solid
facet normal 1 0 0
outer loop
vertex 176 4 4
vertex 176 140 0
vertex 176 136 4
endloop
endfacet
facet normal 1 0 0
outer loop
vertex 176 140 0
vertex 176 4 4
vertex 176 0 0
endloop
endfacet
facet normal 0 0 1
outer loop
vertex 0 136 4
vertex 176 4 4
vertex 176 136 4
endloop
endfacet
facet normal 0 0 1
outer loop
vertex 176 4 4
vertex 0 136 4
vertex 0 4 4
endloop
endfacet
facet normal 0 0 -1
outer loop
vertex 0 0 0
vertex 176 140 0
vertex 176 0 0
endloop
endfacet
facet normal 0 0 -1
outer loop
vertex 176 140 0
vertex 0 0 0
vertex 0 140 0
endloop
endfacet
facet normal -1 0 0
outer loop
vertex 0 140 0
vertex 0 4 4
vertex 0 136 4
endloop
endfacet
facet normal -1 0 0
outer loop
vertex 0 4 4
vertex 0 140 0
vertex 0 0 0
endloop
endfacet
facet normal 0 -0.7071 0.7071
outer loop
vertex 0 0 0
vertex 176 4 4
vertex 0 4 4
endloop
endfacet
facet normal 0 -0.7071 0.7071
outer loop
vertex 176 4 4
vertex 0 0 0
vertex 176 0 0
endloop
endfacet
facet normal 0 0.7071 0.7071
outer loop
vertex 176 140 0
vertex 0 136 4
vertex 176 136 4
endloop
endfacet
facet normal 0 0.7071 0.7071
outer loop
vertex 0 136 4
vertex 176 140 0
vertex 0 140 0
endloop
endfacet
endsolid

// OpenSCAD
thickness = 4;
aqua_deepness = 170;
aqua_width = 352;
cover_height = 120;
pump_width = 90;
pump_height = 40;
back_cable_window_width = 15;
back_cable_window_height = 40;

module side_wall() {
	cube([aqua_deepness + thickness*2,20,thickness]);
	cube([70 + thickness,cover_height,thickness]);
	translate([70 + thickness,20,0]) {
		linear_extrude(height=thickness, convexity=0, twist=0)
		polygon(points=[[0,0],[100+thickness,0],[0,100]], paths=[[0,1,2]]);
	}
	translate([thickness,10,thickness]) {
		cube([aqua_deepness,thickness,thickness]);
	}
}

module back_wall_first_half() {
	difference() {
		union() {
			cube([aqua_width/2,cover_height,thickness]);
			translate([thickness,10,thickness]) {
				cube([aqua_width/2-thickness,thickness,thickness]);
			}
		}
		translate([20,0,0]) {
			cube([back_cable_window_width,back_cable_window_height,50]);
		}
	}
}

module back_wall_second_half() {
	difference() {
		union() {
			cube([aqua_width/2,cover_height,thickness]);
			translate([0,10,thickness]) {
				cube([aqua_width/2-thickness,thickness,thickness]);
			}
		}
		cube([pump_width,pump_height,50]);
	}
}

module front_wall_first_half() {
	cube([aqua_width/2,20,thickness]);
	translate([thickness,10,thickness]) {
		cube([aqua_width/2-thickness,thickness,thickness]);
	}
}

module front_wall_second_half() {
	cube([aqua_width/2,20,thickness]);
	translate([0,10,thickness]) {
		cube([aqua_width/2-thickness,thickness,thickness]);
	}
}

module front_window_half() {
	difference() {
		cube([aqua_width/2,140,thickness]);
		rotate(a=-45, v=[1,0,0]) {
			translate([0,-20,0]) {
				cube([aqua_width/2,20,20]);
			}
		}
		translate([0,140,0]) {
			rotate(a=-45, v=[1,0,0]) {
				translate([0,-20,0]) {
					cube([aqua_width/2,20,20]);
				}
			}
		}
	}
}

front_window_half();
